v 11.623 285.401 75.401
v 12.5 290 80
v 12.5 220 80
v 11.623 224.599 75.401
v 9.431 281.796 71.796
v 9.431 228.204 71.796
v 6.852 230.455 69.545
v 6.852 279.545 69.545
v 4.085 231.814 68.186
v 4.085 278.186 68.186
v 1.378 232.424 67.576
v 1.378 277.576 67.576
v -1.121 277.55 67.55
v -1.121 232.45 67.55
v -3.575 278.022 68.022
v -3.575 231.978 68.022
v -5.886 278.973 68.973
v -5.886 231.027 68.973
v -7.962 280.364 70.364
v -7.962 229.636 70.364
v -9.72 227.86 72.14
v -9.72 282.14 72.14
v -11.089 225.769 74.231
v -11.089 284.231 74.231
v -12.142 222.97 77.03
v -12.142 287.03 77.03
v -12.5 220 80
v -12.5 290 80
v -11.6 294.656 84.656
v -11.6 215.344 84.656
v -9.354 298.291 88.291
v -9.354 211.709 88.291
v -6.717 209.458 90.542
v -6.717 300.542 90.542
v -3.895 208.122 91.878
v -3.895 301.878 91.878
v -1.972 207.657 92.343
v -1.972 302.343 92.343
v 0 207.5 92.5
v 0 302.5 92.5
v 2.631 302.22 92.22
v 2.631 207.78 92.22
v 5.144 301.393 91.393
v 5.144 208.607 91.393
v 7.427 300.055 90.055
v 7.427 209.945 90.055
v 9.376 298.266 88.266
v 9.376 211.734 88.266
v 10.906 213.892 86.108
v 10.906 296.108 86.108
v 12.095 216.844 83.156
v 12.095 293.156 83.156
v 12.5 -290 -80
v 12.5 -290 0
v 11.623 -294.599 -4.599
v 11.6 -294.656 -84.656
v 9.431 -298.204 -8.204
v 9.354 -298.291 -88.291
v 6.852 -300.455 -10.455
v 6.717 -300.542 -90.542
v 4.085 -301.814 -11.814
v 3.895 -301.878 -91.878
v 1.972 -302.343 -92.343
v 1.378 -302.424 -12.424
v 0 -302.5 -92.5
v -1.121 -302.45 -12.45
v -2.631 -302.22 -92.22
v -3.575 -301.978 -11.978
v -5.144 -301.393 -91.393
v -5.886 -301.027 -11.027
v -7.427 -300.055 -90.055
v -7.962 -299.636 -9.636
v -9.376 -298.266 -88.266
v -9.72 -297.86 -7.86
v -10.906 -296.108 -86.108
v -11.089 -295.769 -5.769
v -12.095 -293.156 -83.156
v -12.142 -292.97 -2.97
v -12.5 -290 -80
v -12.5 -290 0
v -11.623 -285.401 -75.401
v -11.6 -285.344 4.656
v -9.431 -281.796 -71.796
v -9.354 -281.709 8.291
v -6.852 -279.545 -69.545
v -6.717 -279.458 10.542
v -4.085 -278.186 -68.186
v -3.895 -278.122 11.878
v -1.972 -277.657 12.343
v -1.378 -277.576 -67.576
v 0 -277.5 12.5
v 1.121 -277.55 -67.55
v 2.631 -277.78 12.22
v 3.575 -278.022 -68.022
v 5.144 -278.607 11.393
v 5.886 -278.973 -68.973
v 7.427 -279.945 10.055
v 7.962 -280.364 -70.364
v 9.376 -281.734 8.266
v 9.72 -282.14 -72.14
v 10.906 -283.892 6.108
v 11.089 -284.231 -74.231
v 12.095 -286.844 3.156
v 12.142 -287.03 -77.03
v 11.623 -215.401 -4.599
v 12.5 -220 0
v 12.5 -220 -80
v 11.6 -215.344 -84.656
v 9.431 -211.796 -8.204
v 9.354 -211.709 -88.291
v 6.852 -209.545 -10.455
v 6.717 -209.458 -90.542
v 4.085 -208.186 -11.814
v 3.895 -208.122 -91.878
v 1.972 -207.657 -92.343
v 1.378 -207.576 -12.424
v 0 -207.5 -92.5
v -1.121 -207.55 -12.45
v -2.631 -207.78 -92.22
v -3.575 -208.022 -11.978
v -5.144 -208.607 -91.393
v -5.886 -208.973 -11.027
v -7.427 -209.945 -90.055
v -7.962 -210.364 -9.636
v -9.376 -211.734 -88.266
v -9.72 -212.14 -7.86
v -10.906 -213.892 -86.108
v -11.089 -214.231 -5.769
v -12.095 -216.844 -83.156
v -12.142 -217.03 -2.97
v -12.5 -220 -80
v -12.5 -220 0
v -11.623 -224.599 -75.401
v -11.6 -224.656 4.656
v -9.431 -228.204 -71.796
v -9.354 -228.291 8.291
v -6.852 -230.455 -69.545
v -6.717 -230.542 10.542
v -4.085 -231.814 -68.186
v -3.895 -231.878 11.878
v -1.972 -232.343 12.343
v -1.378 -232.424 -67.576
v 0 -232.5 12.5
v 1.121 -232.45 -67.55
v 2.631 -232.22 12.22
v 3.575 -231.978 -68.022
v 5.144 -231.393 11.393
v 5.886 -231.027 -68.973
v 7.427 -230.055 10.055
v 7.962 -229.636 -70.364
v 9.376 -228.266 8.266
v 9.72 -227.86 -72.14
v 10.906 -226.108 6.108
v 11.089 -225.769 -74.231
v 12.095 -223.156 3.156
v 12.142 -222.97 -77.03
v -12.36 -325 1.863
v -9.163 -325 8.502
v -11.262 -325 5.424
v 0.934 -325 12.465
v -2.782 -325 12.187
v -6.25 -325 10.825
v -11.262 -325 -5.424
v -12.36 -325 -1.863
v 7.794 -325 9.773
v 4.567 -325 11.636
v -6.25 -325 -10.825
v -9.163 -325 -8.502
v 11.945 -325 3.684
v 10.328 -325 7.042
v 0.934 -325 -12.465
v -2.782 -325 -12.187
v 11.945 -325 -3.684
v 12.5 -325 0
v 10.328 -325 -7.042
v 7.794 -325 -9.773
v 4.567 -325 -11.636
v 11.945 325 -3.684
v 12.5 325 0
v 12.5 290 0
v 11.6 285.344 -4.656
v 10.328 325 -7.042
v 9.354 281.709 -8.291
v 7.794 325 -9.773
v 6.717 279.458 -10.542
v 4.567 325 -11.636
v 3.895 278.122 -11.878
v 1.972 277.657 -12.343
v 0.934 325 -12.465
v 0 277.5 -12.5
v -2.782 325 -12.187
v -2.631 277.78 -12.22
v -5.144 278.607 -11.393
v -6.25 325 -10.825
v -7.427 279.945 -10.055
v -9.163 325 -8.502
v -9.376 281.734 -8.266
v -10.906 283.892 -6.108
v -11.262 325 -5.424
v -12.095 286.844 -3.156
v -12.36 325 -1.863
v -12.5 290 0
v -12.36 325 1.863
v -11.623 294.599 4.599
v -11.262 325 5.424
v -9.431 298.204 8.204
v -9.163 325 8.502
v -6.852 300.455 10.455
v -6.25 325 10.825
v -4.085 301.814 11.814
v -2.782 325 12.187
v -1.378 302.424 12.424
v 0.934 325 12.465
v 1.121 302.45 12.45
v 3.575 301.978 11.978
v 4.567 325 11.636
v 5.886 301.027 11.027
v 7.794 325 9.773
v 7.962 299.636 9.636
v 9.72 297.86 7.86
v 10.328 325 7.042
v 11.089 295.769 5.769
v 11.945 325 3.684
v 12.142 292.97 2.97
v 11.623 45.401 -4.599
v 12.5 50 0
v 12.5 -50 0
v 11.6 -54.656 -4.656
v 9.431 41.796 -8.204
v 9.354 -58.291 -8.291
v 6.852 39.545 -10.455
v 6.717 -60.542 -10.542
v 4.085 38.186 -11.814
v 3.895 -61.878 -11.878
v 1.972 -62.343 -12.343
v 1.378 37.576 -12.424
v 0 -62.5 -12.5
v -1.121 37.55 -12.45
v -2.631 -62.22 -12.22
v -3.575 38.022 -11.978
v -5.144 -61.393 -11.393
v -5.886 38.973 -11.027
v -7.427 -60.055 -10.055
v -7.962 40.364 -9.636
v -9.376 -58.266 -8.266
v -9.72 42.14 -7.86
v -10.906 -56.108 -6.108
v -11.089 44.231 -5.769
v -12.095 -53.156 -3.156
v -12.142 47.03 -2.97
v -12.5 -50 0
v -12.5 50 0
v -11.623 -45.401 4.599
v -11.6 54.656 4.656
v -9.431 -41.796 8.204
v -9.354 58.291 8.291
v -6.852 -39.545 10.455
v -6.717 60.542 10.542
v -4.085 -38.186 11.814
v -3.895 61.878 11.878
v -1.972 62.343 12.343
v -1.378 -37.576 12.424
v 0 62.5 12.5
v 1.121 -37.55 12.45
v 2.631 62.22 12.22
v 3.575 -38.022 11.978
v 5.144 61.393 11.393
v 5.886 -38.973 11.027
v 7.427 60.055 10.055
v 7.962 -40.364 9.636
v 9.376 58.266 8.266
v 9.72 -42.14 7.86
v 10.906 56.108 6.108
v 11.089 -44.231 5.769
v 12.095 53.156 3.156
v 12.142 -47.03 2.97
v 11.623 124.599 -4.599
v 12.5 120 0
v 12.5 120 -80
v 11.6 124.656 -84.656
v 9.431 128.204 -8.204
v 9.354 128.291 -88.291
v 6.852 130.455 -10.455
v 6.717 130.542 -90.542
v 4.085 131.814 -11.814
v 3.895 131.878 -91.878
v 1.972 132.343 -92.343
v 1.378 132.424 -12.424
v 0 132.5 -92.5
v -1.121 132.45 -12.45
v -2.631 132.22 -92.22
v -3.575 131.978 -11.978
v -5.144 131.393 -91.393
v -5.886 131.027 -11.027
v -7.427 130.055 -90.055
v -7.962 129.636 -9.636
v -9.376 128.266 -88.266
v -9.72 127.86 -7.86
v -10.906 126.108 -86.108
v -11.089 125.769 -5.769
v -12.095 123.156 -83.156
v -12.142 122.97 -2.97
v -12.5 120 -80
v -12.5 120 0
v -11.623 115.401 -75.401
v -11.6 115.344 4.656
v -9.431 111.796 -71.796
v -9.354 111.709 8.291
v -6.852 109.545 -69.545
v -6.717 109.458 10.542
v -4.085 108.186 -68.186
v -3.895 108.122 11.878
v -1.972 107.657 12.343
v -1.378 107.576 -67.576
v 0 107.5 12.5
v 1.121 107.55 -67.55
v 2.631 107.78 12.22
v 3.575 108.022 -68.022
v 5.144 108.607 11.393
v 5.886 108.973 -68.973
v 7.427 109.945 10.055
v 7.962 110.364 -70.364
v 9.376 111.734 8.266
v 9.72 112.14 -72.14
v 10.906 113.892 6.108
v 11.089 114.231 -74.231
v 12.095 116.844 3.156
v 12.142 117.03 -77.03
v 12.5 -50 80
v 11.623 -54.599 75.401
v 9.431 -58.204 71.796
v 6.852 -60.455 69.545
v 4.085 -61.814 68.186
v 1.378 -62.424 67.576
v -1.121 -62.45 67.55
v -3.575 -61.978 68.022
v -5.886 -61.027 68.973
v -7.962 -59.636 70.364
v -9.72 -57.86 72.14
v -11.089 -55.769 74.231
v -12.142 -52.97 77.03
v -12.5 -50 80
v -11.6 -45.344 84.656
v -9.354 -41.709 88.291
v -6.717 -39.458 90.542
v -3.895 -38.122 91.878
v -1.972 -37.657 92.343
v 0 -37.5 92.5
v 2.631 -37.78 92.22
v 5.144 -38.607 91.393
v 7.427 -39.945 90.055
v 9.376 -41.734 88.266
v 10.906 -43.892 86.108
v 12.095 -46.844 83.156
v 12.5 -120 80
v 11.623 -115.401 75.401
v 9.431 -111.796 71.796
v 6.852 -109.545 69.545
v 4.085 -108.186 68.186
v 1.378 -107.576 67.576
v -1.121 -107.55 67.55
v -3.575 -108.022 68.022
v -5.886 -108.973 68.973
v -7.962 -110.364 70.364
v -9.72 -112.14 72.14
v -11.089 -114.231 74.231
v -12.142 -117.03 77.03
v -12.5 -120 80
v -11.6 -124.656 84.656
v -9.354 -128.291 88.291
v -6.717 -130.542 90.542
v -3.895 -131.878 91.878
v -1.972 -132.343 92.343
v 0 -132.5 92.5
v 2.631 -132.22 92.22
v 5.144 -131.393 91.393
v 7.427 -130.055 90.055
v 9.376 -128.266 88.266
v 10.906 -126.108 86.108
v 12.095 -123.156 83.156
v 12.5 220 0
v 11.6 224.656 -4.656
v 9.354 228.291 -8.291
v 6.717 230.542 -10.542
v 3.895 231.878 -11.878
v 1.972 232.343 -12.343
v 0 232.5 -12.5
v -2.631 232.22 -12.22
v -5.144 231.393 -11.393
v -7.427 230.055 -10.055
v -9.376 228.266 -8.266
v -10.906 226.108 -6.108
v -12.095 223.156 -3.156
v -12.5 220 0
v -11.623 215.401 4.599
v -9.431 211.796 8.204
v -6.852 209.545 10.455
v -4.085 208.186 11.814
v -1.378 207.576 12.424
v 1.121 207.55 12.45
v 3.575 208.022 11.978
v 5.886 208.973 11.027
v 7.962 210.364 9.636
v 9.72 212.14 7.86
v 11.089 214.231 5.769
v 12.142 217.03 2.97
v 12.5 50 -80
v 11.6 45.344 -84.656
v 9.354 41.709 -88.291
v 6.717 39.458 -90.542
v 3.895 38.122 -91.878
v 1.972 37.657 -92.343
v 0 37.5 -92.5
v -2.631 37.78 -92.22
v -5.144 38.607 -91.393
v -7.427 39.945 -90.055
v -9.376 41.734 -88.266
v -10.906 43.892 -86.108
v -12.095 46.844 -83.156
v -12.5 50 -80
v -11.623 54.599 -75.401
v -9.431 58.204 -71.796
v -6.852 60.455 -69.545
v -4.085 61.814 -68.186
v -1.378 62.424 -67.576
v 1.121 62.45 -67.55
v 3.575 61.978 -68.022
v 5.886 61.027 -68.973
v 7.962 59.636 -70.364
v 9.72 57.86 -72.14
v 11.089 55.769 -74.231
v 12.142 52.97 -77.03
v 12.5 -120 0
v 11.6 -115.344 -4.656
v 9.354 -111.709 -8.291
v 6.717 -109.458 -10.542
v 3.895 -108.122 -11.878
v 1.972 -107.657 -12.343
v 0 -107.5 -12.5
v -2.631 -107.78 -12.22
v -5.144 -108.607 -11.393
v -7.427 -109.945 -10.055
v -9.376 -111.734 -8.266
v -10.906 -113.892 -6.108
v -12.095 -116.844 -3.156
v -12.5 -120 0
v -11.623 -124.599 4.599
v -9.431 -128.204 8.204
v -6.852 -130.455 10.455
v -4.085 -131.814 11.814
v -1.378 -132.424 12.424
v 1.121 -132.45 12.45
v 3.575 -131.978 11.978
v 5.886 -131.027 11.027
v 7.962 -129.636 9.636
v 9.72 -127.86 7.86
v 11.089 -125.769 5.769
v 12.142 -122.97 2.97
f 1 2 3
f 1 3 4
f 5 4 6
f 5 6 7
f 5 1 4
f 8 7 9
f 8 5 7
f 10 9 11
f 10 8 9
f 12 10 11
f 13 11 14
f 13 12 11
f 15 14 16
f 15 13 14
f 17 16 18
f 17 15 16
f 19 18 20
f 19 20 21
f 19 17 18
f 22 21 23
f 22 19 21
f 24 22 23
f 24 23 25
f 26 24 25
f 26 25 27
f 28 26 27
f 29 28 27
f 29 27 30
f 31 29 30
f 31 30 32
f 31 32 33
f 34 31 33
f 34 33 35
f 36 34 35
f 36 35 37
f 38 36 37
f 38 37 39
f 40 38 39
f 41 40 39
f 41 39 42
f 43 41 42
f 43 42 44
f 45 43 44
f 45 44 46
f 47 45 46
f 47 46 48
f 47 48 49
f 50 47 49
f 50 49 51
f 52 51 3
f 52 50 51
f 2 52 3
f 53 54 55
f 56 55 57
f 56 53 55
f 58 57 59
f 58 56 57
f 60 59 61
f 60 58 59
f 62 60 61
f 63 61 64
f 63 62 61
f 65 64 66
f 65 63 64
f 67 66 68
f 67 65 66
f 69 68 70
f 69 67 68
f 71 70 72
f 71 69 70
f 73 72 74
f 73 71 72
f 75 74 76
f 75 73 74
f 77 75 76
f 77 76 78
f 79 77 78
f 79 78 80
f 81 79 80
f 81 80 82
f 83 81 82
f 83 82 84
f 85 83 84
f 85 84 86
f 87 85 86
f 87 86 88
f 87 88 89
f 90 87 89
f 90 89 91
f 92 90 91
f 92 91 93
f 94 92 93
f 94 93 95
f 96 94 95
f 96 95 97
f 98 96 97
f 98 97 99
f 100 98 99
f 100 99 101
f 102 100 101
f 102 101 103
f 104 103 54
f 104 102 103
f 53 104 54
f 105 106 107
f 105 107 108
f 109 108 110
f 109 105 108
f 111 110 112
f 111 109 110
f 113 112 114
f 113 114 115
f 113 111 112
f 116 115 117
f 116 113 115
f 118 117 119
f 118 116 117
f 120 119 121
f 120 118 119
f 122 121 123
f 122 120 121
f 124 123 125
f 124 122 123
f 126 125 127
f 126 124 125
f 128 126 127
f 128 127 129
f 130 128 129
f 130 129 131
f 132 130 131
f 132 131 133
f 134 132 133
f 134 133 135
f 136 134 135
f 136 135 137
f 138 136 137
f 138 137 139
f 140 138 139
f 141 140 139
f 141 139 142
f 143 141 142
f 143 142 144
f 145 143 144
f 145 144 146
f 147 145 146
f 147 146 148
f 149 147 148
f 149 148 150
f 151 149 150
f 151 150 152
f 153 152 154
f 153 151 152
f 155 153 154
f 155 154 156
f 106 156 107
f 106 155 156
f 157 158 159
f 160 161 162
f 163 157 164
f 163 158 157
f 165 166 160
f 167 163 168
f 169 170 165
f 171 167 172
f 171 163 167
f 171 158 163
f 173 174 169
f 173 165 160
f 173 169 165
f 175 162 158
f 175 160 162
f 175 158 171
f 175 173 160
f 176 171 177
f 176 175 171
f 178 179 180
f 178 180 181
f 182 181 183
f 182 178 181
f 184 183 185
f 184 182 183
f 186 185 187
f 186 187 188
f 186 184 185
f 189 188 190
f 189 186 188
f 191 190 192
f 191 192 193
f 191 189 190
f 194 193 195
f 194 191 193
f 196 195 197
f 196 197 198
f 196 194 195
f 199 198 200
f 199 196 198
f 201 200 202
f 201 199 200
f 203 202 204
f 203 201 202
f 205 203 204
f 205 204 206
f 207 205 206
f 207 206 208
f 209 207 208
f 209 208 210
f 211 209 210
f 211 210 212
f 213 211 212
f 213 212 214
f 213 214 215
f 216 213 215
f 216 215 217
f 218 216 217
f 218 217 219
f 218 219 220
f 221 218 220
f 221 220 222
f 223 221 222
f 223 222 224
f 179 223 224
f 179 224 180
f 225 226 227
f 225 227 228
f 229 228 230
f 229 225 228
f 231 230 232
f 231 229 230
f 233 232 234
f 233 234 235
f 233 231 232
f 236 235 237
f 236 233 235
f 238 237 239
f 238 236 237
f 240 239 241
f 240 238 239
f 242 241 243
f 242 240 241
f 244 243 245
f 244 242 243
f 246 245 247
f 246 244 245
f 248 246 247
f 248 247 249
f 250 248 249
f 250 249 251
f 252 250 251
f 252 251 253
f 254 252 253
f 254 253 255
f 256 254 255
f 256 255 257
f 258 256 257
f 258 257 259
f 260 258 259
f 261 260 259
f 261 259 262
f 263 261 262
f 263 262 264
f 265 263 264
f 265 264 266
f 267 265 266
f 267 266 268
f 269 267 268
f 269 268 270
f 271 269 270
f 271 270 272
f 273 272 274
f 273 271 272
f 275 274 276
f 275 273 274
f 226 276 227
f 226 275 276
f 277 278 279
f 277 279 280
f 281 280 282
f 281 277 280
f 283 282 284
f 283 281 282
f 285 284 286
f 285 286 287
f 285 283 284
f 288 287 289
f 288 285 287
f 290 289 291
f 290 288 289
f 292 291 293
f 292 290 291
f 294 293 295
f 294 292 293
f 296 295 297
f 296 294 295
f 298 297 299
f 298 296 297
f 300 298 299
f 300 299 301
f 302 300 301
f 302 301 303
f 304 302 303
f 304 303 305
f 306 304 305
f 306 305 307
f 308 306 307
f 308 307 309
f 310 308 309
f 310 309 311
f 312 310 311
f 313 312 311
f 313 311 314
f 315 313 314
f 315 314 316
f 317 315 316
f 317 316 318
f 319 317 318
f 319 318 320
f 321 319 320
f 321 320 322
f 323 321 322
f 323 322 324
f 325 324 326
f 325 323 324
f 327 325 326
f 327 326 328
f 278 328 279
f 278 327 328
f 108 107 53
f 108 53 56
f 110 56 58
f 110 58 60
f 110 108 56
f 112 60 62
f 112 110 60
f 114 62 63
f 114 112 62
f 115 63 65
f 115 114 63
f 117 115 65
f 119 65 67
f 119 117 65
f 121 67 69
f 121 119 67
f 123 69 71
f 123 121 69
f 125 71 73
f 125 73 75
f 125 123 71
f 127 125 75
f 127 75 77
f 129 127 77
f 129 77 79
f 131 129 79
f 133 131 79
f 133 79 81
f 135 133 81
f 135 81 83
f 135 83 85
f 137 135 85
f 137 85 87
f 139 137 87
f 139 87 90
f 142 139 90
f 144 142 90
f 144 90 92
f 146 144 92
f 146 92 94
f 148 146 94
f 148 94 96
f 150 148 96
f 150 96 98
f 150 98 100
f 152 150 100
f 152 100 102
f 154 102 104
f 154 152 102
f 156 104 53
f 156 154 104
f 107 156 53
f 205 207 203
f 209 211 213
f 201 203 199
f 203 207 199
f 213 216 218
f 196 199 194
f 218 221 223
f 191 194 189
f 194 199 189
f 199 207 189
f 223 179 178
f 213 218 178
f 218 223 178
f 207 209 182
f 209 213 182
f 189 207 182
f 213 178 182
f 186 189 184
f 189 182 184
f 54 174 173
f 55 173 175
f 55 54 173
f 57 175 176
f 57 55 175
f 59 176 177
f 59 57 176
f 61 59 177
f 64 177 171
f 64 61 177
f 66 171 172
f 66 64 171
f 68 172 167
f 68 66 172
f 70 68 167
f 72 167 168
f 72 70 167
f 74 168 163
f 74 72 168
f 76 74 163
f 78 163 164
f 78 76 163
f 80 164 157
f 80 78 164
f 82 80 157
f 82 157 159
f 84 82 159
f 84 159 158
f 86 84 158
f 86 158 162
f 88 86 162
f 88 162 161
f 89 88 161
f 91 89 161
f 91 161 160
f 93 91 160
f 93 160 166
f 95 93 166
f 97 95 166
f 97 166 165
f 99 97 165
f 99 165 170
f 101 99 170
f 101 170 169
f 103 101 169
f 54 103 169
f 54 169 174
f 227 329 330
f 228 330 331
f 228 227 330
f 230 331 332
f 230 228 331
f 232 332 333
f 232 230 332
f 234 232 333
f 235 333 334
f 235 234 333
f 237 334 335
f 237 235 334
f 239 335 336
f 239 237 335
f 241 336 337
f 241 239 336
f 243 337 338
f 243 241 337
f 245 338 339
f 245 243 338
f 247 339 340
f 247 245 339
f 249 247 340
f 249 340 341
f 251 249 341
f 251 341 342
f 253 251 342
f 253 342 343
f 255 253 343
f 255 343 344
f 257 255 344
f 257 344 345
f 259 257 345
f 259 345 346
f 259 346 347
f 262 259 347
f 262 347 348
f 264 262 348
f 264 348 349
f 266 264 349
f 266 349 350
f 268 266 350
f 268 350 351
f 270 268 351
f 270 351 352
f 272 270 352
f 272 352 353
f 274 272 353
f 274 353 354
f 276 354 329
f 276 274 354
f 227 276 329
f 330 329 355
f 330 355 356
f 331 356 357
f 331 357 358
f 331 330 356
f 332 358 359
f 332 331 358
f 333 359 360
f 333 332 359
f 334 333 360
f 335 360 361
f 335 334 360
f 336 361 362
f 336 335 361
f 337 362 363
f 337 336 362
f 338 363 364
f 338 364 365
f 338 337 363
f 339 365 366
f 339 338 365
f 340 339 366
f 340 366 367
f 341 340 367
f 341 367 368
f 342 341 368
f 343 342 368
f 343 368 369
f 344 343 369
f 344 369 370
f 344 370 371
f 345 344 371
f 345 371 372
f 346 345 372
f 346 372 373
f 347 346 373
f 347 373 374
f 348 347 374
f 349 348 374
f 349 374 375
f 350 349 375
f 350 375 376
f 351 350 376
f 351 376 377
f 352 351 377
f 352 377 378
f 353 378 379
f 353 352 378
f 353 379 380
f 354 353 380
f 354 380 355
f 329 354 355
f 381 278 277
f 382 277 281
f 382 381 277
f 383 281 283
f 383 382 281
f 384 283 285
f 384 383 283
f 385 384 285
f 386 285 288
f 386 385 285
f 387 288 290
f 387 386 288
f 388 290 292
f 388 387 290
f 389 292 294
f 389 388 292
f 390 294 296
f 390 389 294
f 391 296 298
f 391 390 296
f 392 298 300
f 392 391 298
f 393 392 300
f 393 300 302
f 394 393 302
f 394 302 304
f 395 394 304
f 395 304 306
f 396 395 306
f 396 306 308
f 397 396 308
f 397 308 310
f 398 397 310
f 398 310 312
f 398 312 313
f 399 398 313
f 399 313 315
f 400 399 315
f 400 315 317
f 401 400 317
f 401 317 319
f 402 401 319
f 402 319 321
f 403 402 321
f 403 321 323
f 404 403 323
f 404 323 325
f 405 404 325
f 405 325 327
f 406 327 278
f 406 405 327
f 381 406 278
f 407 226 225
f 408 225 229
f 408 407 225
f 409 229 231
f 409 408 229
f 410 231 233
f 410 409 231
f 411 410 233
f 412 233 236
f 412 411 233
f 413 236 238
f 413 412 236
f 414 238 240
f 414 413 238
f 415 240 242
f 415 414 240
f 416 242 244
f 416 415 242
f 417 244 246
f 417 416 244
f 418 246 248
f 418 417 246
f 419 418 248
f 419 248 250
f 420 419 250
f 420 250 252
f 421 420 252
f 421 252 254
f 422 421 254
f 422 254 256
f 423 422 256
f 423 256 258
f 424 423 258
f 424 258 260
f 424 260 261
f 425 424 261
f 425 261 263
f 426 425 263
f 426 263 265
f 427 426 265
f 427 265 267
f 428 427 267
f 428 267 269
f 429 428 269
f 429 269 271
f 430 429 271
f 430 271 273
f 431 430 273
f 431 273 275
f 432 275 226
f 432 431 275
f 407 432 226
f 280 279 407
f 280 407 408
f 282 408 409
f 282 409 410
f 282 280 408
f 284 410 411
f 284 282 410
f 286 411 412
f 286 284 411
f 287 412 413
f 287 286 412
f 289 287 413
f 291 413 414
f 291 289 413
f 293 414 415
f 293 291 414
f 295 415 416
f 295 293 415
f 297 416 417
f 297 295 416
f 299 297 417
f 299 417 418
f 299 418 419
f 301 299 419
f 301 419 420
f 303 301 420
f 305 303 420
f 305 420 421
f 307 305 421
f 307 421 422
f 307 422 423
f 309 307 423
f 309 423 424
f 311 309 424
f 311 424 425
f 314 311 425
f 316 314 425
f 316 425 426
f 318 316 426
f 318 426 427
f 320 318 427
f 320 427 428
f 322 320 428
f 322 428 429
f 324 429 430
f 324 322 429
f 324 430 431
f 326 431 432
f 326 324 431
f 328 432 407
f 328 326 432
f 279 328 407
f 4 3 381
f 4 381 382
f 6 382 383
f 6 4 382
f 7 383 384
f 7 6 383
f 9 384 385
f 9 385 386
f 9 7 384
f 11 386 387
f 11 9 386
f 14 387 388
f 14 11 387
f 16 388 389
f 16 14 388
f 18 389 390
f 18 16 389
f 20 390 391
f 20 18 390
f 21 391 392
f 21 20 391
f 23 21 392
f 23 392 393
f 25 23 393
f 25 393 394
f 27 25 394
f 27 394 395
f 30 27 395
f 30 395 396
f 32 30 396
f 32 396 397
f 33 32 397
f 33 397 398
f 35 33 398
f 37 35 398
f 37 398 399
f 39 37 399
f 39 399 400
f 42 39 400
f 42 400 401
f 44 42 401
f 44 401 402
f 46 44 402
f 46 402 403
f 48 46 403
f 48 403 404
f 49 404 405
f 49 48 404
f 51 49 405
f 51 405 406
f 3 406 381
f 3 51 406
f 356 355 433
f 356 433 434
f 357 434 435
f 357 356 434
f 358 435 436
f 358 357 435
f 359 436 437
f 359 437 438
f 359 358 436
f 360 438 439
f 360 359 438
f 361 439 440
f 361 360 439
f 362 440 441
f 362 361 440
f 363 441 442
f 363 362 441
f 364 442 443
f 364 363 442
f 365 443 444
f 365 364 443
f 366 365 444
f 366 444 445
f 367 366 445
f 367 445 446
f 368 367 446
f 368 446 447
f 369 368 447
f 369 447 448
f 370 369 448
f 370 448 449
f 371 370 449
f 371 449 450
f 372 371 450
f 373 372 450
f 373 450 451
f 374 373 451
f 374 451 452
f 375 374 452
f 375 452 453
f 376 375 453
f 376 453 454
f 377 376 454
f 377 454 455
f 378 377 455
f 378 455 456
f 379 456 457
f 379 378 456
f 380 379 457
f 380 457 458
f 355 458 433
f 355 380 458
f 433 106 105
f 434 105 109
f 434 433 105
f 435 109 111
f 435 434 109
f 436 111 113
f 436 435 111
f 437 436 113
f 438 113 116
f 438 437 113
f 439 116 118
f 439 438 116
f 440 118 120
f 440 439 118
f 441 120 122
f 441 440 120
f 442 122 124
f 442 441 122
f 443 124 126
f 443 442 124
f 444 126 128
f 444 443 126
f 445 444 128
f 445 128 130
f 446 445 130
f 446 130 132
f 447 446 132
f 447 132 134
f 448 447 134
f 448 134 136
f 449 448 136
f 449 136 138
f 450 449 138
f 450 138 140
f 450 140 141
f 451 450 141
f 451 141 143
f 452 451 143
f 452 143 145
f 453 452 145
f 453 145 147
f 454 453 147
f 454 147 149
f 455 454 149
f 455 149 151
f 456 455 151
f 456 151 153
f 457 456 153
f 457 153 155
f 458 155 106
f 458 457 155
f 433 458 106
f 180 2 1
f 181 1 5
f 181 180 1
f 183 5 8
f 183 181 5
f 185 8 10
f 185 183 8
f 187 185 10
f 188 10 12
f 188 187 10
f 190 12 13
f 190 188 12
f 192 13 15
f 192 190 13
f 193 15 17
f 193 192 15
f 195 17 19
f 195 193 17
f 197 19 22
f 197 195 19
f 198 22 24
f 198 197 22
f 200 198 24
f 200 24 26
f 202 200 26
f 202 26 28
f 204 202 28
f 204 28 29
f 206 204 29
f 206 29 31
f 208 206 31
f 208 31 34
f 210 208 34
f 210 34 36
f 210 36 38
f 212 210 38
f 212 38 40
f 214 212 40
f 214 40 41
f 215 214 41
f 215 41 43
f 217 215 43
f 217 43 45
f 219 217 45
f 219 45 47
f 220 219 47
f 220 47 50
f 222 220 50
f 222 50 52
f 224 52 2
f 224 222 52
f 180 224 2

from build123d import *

# Parameters (mm, degrees)
F2_R = 12.5


with BuildPart() as f3:
    # F3: sweep along a path in F0
    with BuildLine(Plane.YZ) as f3_path:
        Line((-325, 0), (-290, 0))
        Line((-290, 0), (-290, -80))
        Line((-290, -80), (-220, -80))
        Line((-220, -80), (-220, 0))
        Line((-220, 0), (-120, 0))
        Line((-120, 0), (-120, 80))
        Line((-120, 80), (-50, 80))
        Line((-50, 80), (-50, 0))
        Line((-50, 0), (50, 0))
        Line((50, 0), (50, -80))
        Line((50, -80), (120, -80))
        Line((120, -80), (120, 0))
        Line((120, 0), (220, 0))
        Line((220, 0), (220, 80))
        Line((220, 80), (290, 80))
        Line((290, 80), (290, 0))
        Line((290, 0), (325, 0))
    # F2 (on plane+point) → F3 (sweep)
    with BuildSketch(Plane.XZ.offset(325)):
        Circle(F2_R)
    sweep(path=f3_path.line, transition=Transition.RIGHT)


solid = f3.part
